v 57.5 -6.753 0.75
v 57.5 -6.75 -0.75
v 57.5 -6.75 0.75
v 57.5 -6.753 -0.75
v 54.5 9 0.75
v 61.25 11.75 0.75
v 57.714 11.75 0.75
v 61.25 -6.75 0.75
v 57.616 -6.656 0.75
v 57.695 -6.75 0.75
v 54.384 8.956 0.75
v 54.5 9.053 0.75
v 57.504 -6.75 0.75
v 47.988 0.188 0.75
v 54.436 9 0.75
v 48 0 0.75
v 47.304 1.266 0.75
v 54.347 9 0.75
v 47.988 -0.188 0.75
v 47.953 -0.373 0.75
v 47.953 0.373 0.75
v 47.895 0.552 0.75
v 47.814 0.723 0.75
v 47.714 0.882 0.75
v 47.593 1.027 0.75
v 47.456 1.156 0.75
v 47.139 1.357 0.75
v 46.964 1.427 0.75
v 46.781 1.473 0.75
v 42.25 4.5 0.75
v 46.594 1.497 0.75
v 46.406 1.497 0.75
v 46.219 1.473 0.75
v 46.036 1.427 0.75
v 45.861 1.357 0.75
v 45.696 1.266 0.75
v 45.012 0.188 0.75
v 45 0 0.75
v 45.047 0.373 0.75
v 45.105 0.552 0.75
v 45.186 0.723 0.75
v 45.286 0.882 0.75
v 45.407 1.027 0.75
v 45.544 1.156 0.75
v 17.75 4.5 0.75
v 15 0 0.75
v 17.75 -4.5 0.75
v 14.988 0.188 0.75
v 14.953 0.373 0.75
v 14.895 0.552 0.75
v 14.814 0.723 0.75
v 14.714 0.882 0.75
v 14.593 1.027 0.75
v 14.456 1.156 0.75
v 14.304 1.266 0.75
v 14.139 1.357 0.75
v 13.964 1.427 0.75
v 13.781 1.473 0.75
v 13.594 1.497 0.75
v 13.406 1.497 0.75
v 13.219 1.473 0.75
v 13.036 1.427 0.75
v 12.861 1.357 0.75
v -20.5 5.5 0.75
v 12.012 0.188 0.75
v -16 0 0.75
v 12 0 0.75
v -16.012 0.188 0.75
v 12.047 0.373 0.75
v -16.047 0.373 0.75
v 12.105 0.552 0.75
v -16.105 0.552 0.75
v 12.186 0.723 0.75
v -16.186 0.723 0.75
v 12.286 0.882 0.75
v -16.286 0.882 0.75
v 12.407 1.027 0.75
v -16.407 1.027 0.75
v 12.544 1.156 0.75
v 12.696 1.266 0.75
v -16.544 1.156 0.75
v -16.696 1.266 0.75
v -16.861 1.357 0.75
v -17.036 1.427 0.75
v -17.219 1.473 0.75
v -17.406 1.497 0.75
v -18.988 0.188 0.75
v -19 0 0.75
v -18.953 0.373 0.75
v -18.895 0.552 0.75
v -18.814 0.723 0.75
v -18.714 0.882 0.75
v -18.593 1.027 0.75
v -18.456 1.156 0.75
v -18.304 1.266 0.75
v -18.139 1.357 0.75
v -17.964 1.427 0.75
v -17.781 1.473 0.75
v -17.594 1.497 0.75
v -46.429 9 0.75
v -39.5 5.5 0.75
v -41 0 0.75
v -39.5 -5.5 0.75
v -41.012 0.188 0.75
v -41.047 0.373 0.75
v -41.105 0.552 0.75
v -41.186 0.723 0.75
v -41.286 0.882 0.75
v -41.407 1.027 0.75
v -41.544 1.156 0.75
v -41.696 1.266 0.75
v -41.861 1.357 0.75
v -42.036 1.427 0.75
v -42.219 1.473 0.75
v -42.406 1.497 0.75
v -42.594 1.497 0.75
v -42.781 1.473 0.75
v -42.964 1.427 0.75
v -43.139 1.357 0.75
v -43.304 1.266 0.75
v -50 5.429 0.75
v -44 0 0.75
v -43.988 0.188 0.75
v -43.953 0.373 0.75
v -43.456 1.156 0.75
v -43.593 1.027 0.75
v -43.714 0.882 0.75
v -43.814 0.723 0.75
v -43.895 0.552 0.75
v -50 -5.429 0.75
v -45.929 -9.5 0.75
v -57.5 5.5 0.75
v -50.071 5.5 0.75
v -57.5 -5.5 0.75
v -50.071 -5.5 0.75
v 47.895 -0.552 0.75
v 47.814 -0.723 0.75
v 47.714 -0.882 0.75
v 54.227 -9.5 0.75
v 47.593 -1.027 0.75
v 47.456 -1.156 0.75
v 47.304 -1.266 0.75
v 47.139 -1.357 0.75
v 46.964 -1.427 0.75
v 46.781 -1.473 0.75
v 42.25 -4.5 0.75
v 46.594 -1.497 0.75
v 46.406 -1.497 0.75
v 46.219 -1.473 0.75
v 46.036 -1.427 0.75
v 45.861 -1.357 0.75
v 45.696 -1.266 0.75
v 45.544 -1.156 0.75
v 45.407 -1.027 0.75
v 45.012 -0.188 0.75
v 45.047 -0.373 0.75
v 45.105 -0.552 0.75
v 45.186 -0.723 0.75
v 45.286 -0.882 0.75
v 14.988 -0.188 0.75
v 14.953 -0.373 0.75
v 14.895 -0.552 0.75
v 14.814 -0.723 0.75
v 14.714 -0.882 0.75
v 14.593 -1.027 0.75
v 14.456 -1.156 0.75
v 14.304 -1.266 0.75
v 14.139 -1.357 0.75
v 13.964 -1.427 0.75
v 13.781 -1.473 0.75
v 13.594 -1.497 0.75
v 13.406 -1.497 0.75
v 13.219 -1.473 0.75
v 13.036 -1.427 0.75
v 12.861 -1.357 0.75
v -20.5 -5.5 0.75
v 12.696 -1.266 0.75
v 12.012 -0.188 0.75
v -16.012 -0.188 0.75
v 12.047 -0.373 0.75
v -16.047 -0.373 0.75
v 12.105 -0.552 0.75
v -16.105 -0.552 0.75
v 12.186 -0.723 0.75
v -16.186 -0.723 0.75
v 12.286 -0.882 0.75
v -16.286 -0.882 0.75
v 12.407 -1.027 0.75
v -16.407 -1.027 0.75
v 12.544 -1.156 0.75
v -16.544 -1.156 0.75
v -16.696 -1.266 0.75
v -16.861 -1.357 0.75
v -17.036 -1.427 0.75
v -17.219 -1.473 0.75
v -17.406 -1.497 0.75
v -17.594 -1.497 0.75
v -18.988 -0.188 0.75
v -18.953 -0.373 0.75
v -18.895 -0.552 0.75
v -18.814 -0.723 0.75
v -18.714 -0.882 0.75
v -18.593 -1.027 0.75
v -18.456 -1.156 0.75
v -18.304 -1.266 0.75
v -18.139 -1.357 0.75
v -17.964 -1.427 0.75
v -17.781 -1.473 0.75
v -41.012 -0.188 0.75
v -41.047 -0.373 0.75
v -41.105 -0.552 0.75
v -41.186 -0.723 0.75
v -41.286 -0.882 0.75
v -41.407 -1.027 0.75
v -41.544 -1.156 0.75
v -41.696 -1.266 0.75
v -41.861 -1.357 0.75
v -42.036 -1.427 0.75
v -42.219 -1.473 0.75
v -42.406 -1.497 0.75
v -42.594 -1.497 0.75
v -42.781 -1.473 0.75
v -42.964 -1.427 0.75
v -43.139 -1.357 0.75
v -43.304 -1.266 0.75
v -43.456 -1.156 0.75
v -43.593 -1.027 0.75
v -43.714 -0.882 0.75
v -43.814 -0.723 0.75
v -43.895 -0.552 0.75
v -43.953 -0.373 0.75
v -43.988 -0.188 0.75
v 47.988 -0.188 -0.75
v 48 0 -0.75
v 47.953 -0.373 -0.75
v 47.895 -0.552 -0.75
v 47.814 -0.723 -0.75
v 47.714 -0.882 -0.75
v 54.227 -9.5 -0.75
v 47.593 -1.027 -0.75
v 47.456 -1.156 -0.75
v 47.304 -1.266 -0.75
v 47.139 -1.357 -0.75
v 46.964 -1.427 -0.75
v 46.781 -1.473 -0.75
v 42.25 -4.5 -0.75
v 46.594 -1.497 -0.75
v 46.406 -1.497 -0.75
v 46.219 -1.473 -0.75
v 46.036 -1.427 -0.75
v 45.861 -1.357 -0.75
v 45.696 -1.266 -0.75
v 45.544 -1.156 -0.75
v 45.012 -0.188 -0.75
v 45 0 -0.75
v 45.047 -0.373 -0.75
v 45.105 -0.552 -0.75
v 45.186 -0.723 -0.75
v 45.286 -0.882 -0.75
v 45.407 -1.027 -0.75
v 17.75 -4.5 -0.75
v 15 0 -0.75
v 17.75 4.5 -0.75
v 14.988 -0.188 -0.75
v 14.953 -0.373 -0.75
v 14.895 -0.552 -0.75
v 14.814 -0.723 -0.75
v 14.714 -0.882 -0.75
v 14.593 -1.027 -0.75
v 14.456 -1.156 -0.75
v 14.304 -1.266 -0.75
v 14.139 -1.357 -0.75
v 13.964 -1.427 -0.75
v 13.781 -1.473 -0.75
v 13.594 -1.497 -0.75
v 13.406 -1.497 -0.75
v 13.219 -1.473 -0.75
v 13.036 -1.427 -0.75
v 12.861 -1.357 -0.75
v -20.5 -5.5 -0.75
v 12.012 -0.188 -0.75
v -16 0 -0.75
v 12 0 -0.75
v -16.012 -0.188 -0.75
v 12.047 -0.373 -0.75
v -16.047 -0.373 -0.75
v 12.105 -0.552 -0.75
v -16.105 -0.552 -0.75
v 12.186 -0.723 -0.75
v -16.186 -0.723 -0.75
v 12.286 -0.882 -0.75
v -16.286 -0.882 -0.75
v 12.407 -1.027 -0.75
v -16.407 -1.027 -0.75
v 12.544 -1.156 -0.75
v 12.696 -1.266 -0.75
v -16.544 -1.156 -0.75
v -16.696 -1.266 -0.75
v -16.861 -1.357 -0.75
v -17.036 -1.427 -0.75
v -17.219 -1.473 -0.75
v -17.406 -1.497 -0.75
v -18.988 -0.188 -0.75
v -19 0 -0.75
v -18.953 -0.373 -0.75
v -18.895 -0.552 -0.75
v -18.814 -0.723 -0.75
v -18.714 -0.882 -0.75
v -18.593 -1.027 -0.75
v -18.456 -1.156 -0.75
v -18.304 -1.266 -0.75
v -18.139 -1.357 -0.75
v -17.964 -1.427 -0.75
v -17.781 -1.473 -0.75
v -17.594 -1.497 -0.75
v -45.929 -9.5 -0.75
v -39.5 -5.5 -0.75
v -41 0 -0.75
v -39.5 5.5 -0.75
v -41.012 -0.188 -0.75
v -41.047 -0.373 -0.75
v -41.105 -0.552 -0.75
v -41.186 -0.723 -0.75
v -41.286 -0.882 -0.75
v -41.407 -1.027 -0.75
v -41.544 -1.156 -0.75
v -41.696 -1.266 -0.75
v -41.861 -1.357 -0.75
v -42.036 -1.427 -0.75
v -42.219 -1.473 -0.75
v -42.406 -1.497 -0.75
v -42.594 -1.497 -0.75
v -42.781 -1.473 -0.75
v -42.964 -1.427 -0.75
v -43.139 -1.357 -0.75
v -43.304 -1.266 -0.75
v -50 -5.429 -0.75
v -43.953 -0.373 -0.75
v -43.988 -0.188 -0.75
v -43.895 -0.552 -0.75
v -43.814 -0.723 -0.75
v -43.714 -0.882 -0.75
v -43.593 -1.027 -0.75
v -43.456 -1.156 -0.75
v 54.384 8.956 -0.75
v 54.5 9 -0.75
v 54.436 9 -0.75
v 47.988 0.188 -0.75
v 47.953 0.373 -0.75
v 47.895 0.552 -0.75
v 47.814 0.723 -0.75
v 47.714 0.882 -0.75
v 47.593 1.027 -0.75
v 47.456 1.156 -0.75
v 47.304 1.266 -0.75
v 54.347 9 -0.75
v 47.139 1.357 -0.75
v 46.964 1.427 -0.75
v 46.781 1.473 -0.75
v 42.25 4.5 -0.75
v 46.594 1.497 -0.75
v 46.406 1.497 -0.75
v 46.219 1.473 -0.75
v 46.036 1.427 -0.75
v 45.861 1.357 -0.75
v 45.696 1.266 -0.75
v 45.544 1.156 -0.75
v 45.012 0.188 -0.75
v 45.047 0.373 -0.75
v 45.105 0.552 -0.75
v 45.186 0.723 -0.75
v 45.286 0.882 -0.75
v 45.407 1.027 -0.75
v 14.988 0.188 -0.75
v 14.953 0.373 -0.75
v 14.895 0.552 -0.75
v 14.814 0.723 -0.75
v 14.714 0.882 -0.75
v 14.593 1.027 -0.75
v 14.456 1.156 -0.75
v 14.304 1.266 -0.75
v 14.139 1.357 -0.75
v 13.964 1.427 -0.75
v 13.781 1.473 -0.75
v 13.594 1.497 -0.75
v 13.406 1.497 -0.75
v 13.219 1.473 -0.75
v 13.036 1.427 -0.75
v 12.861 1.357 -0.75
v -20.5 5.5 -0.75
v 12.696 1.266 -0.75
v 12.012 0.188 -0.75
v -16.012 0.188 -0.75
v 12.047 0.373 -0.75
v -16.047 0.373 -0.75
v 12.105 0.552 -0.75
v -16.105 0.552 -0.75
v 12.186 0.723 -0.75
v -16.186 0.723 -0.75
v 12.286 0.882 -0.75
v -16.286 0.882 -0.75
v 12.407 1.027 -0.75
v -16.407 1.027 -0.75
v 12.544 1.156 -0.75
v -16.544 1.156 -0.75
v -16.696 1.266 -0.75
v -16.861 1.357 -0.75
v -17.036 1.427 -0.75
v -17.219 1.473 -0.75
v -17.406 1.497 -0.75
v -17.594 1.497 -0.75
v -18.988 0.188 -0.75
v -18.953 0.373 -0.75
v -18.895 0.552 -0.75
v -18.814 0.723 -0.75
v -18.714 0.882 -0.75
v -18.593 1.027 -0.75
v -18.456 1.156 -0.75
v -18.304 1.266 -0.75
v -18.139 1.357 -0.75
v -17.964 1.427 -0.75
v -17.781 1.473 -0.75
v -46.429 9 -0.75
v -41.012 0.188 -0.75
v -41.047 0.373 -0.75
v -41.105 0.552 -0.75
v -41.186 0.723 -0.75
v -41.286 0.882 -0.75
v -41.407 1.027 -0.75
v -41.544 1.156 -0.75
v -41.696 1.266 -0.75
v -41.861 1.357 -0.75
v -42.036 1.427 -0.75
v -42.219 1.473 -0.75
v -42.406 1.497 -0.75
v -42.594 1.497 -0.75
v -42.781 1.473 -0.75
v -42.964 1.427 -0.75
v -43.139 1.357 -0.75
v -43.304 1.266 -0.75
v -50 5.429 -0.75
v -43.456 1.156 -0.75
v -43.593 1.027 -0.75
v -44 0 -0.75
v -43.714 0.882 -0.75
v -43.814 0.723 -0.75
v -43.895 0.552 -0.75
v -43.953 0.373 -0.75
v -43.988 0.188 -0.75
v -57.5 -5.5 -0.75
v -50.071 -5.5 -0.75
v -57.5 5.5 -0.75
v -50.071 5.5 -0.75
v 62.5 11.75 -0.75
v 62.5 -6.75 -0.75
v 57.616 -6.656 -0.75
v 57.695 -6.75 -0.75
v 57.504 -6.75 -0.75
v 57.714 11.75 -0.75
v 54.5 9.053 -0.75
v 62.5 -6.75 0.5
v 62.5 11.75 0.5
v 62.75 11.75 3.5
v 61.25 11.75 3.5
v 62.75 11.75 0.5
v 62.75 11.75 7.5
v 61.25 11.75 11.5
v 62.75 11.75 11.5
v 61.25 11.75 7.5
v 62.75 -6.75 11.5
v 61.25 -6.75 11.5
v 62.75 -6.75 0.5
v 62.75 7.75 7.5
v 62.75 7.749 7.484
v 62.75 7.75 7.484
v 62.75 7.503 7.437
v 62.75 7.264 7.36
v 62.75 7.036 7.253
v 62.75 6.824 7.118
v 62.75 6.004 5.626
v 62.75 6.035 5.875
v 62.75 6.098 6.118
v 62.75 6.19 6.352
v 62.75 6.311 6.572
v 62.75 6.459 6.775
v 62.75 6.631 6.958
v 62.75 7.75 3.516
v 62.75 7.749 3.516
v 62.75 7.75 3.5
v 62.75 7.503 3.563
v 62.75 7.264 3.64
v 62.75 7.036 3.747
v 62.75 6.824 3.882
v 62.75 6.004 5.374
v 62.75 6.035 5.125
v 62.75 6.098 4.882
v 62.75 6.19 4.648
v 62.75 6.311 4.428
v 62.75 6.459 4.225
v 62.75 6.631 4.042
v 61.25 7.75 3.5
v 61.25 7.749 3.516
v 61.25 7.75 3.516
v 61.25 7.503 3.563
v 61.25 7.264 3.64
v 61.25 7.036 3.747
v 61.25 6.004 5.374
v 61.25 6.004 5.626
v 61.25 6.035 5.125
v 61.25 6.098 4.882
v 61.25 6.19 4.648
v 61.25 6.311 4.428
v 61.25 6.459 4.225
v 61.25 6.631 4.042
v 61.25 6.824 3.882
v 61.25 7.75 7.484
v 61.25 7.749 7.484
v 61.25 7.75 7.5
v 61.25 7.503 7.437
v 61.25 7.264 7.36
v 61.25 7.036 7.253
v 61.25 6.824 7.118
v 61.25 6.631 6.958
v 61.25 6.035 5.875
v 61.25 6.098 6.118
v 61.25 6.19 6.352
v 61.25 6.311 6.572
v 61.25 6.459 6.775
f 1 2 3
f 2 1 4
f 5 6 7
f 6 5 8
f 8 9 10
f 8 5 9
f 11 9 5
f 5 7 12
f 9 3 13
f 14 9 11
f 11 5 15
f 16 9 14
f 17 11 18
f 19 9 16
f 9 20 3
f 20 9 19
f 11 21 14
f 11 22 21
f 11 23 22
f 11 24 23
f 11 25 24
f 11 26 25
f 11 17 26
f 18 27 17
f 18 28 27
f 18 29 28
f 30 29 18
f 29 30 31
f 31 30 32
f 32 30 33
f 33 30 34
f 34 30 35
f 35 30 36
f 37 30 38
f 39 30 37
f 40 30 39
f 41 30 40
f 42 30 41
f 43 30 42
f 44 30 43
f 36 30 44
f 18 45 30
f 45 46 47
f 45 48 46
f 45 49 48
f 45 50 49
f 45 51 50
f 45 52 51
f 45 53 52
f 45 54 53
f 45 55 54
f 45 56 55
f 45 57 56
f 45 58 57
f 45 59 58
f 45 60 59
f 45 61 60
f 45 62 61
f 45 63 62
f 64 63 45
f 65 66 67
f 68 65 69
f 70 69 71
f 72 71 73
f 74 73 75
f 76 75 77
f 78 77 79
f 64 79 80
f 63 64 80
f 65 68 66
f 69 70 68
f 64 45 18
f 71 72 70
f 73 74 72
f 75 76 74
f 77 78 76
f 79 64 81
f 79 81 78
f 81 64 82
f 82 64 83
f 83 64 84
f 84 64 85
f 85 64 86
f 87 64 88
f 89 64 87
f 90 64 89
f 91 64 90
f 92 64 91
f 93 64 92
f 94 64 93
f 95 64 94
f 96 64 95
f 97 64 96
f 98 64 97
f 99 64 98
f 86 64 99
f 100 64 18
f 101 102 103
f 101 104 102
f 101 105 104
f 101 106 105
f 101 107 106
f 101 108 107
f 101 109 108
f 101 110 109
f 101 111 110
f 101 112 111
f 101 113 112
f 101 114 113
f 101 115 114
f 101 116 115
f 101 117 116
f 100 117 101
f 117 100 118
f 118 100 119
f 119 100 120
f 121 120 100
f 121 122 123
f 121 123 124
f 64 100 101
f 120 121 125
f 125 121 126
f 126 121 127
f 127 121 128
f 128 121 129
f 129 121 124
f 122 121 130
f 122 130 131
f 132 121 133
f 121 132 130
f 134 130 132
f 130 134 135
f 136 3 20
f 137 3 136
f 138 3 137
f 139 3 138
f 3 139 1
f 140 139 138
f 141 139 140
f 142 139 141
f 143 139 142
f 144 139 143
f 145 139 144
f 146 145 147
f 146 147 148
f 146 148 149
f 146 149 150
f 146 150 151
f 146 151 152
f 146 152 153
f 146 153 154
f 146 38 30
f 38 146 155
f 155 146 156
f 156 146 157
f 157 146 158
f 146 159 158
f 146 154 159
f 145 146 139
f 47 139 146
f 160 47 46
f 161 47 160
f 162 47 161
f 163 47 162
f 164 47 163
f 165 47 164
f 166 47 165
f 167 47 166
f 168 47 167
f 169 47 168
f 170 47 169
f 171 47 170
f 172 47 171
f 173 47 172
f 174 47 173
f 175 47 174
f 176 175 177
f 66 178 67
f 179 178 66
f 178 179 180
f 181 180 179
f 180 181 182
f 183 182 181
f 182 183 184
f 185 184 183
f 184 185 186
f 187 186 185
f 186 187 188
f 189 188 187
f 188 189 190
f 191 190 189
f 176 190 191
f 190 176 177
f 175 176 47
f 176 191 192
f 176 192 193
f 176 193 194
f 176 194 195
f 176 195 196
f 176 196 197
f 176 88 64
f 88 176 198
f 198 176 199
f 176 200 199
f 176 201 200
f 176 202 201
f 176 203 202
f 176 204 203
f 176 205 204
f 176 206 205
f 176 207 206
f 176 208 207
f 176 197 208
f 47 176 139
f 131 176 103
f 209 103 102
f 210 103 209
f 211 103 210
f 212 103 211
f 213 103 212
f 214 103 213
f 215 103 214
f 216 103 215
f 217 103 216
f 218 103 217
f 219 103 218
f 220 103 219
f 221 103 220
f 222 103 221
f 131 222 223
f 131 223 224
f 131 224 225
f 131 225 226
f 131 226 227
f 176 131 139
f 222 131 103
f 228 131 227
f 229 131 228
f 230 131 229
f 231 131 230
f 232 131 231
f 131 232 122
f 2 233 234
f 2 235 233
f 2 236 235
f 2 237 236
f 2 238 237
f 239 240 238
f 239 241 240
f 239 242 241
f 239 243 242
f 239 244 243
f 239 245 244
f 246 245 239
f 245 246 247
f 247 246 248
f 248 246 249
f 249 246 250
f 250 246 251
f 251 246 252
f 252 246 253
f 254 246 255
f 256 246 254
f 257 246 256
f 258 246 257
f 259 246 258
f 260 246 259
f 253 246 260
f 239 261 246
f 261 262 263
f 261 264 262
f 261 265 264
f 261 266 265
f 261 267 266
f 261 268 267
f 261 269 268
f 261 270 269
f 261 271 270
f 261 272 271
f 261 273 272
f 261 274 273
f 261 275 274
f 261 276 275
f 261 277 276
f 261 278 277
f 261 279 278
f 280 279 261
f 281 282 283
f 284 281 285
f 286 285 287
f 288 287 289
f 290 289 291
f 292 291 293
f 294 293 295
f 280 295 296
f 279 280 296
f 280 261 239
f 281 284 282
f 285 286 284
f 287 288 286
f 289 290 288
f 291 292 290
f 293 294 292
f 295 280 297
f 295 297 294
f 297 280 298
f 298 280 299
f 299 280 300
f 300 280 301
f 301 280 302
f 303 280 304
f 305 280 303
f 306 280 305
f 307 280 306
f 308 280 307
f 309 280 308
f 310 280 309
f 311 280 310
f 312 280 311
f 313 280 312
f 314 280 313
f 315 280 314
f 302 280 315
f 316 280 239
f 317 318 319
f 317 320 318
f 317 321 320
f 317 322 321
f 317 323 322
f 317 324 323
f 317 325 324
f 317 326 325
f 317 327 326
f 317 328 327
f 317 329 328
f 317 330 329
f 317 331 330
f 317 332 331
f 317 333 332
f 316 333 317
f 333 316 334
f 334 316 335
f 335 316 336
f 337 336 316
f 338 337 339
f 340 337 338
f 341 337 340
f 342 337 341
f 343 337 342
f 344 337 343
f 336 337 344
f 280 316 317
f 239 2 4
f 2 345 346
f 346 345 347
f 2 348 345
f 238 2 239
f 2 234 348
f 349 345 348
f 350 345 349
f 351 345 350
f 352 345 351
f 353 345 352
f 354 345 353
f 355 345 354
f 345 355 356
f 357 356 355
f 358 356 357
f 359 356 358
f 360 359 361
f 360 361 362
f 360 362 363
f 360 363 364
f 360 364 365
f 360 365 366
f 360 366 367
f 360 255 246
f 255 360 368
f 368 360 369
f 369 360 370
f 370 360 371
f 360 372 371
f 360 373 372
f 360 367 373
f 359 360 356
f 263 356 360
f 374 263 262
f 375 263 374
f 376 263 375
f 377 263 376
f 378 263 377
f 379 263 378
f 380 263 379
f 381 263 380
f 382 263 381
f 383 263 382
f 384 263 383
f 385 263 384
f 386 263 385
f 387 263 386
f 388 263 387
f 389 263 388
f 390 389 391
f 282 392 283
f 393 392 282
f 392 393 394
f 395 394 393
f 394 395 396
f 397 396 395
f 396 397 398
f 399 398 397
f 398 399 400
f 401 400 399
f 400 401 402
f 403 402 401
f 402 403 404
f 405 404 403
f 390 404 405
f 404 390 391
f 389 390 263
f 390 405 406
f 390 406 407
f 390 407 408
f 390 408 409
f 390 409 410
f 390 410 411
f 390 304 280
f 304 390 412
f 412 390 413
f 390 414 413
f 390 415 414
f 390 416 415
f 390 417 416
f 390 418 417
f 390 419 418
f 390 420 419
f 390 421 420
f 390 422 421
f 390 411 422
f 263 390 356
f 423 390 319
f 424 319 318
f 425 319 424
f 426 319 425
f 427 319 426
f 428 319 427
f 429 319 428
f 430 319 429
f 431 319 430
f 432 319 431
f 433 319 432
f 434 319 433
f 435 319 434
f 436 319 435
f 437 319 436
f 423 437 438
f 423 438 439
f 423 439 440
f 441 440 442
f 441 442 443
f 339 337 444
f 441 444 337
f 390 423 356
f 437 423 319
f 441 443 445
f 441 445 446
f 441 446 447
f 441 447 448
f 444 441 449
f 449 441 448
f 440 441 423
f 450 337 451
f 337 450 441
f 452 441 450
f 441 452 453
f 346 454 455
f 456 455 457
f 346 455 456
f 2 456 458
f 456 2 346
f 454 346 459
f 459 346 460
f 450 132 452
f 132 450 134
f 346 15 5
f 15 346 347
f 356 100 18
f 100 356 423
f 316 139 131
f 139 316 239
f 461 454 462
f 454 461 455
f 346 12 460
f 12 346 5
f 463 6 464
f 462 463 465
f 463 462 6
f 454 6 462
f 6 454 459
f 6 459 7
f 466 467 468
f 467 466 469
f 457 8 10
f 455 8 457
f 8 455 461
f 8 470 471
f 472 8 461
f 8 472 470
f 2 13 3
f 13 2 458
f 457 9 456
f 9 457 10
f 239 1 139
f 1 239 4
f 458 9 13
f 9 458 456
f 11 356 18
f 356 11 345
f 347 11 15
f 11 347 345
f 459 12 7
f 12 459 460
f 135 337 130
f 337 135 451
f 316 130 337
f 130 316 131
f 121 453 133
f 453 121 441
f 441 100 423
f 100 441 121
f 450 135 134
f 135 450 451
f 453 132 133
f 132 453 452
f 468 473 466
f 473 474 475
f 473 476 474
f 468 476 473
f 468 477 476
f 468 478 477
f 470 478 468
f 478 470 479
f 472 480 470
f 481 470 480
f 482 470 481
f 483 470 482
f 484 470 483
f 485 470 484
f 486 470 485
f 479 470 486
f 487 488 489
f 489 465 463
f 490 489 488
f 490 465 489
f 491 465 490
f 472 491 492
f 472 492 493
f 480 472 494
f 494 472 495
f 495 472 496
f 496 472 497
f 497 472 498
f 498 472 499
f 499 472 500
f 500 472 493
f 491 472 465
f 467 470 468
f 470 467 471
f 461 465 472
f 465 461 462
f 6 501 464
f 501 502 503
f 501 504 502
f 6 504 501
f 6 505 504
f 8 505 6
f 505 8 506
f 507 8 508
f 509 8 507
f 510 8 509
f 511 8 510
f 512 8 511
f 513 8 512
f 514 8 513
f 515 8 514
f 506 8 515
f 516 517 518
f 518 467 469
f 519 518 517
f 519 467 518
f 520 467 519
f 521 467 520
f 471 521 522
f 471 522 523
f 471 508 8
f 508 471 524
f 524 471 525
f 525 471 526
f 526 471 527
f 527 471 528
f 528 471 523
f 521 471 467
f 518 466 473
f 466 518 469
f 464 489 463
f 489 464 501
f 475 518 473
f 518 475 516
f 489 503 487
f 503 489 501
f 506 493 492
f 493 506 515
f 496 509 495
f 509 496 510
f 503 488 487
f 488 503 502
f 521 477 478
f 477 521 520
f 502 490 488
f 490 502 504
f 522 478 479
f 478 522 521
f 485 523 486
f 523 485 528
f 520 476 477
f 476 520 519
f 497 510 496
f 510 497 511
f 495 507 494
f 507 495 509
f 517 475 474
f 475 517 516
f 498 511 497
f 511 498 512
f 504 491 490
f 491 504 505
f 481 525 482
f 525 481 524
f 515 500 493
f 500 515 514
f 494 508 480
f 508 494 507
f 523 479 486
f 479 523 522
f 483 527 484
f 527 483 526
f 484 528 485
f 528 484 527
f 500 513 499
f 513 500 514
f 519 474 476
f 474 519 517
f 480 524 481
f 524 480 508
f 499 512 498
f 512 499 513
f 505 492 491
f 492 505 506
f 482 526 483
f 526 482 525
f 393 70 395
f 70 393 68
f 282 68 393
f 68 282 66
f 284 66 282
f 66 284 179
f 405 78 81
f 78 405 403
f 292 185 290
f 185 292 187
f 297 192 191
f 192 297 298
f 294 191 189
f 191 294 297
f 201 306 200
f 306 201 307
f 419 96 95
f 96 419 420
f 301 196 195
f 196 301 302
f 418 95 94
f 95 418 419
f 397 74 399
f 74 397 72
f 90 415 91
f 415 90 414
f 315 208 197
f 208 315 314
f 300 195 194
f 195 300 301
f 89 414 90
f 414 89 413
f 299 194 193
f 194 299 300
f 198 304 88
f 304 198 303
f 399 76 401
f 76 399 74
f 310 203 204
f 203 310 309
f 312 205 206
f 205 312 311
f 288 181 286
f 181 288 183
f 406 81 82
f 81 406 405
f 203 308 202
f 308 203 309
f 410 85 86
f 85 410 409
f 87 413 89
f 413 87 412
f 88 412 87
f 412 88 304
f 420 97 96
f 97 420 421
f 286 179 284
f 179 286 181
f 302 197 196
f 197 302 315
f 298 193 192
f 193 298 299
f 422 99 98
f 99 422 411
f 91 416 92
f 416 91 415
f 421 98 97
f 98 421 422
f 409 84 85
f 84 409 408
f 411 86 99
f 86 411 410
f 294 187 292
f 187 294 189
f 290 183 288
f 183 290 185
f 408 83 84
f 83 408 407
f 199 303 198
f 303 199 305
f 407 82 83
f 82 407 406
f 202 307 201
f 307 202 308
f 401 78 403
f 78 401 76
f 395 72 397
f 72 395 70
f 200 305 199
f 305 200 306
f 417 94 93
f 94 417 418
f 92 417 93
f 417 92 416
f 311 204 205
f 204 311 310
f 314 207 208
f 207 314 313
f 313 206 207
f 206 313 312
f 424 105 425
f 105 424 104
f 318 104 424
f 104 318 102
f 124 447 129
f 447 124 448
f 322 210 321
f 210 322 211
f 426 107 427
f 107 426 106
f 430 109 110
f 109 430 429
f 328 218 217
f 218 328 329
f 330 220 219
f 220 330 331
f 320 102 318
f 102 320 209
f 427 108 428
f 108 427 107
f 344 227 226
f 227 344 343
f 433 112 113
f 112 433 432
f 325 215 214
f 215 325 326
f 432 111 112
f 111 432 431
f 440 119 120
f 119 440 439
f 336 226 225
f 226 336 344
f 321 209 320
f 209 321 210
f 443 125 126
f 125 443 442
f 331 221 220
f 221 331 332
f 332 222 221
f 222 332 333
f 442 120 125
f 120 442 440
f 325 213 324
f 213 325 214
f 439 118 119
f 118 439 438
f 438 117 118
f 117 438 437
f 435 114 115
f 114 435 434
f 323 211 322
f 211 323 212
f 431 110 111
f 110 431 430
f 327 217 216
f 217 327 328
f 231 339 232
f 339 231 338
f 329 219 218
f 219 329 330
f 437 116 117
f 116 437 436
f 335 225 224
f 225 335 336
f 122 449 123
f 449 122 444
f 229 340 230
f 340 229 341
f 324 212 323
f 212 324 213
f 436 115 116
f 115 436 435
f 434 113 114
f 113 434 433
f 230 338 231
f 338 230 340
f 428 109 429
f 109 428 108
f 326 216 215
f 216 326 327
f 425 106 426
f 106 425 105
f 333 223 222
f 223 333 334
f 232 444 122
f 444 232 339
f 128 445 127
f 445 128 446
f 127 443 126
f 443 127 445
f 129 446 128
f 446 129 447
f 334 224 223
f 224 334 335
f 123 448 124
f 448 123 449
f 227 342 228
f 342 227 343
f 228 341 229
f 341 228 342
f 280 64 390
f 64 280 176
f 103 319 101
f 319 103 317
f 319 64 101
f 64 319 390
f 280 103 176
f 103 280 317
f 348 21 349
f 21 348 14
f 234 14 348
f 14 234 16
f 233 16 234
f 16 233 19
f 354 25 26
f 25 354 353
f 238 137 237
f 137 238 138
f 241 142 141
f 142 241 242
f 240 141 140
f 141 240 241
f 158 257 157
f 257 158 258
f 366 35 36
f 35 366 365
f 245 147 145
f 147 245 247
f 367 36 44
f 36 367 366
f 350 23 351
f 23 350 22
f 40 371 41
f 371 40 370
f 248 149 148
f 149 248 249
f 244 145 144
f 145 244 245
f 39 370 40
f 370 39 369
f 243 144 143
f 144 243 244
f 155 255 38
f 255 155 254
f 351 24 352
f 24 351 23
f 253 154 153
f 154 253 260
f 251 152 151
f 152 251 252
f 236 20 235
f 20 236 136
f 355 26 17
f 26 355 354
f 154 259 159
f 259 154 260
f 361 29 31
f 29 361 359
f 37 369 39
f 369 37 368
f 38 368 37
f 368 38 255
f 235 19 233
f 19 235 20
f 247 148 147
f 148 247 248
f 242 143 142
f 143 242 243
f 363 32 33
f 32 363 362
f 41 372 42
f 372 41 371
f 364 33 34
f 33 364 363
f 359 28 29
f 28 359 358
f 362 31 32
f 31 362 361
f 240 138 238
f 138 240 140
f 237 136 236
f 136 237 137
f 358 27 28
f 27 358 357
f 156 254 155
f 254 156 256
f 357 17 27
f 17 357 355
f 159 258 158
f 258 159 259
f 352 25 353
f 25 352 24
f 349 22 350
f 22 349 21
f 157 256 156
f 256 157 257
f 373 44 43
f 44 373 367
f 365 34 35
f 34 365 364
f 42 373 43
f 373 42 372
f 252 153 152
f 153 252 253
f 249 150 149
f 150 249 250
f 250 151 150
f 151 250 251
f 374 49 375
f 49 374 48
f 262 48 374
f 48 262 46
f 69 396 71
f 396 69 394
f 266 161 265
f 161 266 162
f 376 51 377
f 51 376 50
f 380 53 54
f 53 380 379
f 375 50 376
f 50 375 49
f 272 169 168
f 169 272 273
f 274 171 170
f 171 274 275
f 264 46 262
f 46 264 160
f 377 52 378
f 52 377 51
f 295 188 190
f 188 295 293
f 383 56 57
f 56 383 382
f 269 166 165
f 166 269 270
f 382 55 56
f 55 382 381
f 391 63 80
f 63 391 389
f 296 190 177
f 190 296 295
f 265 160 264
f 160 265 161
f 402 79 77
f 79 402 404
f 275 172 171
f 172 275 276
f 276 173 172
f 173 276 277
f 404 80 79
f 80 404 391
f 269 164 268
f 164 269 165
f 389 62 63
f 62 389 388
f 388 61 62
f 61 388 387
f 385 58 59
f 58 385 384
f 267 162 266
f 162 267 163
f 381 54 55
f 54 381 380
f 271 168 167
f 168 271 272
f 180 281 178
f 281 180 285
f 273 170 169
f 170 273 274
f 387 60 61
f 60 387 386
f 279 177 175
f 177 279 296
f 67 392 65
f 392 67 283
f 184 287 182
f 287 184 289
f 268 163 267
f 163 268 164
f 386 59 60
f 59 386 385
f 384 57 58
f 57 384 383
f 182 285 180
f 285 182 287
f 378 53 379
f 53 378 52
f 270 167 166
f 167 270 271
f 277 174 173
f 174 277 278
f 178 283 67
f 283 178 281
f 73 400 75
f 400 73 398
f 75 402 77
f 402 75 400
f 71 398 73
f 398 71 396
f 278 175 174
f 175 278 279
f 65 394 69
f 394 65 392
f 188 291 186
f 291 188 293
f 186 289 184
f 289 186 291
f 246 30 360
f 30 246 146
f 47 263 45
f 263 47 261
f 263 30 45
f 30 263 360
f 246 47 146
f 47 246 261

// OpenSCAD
thickness=1.5;

module pci_bracket() {
union() {
difference() {
union () {
translate([0,-0.25,0]) cube([115,18.5,thickness],center=true);
translate([58.5,2.5,0]) cube([8,18.5,thickness],center=true);
}
translate([57,-13.7,0]) rotate([0,0,40]) cube([10,10,10],center=true);
translate([55,16,0]) rotate([0,0,40]) cube([10,10,10],center=true);
translate([-50,-12.5,0]) rotate([0,0,45]) cube([10,10,10],center=true);
translate([-50,12.5,0]) rotate([0,0,45]) cube([10,10,10],center=true);
translate([-55,-10.5,0]) cube([10,10,10],center=true);
translate([-55,10.5,0]) cube([10,10,10],center=true);
}
difference() {
translate([62,2.5,6]) cube([thickness,18.5,11],center=true);
translate([62,10.75,5.5]) cube([2,6,4],center=true);
translate([62,8,5.5]) rotate([0,90,0]) cylinder(r=2,h=2,center=true);
}
}
}

module vga_hole() { //28 long
translate([12.5,0,0]) cylinder(r=1.5,h=10,center=true);
translate([-12.5,0,0]) cylinder(r=1.5,h=10,center=true);
cube([19,11,10],center=true);
}

module dvi_hole() { //36 long
union() {
translate([16.5,0,0]) cylinder(r=1.5,h=10,center=true);
translate([-16.5,0,0]) cylinder(r=1.5,h=10,center=true);
cube([24.5,9,10],center=true);
}
}

difference() {
pci_bracket();
translate([-30,0,0]) {
//translate([35,1,0]) {
 vga_hole();
 translate([60,0,0]) {
// translate([-41,-2,0]) {
  dvi_hole();
  }
 }
}

$fn=50;
